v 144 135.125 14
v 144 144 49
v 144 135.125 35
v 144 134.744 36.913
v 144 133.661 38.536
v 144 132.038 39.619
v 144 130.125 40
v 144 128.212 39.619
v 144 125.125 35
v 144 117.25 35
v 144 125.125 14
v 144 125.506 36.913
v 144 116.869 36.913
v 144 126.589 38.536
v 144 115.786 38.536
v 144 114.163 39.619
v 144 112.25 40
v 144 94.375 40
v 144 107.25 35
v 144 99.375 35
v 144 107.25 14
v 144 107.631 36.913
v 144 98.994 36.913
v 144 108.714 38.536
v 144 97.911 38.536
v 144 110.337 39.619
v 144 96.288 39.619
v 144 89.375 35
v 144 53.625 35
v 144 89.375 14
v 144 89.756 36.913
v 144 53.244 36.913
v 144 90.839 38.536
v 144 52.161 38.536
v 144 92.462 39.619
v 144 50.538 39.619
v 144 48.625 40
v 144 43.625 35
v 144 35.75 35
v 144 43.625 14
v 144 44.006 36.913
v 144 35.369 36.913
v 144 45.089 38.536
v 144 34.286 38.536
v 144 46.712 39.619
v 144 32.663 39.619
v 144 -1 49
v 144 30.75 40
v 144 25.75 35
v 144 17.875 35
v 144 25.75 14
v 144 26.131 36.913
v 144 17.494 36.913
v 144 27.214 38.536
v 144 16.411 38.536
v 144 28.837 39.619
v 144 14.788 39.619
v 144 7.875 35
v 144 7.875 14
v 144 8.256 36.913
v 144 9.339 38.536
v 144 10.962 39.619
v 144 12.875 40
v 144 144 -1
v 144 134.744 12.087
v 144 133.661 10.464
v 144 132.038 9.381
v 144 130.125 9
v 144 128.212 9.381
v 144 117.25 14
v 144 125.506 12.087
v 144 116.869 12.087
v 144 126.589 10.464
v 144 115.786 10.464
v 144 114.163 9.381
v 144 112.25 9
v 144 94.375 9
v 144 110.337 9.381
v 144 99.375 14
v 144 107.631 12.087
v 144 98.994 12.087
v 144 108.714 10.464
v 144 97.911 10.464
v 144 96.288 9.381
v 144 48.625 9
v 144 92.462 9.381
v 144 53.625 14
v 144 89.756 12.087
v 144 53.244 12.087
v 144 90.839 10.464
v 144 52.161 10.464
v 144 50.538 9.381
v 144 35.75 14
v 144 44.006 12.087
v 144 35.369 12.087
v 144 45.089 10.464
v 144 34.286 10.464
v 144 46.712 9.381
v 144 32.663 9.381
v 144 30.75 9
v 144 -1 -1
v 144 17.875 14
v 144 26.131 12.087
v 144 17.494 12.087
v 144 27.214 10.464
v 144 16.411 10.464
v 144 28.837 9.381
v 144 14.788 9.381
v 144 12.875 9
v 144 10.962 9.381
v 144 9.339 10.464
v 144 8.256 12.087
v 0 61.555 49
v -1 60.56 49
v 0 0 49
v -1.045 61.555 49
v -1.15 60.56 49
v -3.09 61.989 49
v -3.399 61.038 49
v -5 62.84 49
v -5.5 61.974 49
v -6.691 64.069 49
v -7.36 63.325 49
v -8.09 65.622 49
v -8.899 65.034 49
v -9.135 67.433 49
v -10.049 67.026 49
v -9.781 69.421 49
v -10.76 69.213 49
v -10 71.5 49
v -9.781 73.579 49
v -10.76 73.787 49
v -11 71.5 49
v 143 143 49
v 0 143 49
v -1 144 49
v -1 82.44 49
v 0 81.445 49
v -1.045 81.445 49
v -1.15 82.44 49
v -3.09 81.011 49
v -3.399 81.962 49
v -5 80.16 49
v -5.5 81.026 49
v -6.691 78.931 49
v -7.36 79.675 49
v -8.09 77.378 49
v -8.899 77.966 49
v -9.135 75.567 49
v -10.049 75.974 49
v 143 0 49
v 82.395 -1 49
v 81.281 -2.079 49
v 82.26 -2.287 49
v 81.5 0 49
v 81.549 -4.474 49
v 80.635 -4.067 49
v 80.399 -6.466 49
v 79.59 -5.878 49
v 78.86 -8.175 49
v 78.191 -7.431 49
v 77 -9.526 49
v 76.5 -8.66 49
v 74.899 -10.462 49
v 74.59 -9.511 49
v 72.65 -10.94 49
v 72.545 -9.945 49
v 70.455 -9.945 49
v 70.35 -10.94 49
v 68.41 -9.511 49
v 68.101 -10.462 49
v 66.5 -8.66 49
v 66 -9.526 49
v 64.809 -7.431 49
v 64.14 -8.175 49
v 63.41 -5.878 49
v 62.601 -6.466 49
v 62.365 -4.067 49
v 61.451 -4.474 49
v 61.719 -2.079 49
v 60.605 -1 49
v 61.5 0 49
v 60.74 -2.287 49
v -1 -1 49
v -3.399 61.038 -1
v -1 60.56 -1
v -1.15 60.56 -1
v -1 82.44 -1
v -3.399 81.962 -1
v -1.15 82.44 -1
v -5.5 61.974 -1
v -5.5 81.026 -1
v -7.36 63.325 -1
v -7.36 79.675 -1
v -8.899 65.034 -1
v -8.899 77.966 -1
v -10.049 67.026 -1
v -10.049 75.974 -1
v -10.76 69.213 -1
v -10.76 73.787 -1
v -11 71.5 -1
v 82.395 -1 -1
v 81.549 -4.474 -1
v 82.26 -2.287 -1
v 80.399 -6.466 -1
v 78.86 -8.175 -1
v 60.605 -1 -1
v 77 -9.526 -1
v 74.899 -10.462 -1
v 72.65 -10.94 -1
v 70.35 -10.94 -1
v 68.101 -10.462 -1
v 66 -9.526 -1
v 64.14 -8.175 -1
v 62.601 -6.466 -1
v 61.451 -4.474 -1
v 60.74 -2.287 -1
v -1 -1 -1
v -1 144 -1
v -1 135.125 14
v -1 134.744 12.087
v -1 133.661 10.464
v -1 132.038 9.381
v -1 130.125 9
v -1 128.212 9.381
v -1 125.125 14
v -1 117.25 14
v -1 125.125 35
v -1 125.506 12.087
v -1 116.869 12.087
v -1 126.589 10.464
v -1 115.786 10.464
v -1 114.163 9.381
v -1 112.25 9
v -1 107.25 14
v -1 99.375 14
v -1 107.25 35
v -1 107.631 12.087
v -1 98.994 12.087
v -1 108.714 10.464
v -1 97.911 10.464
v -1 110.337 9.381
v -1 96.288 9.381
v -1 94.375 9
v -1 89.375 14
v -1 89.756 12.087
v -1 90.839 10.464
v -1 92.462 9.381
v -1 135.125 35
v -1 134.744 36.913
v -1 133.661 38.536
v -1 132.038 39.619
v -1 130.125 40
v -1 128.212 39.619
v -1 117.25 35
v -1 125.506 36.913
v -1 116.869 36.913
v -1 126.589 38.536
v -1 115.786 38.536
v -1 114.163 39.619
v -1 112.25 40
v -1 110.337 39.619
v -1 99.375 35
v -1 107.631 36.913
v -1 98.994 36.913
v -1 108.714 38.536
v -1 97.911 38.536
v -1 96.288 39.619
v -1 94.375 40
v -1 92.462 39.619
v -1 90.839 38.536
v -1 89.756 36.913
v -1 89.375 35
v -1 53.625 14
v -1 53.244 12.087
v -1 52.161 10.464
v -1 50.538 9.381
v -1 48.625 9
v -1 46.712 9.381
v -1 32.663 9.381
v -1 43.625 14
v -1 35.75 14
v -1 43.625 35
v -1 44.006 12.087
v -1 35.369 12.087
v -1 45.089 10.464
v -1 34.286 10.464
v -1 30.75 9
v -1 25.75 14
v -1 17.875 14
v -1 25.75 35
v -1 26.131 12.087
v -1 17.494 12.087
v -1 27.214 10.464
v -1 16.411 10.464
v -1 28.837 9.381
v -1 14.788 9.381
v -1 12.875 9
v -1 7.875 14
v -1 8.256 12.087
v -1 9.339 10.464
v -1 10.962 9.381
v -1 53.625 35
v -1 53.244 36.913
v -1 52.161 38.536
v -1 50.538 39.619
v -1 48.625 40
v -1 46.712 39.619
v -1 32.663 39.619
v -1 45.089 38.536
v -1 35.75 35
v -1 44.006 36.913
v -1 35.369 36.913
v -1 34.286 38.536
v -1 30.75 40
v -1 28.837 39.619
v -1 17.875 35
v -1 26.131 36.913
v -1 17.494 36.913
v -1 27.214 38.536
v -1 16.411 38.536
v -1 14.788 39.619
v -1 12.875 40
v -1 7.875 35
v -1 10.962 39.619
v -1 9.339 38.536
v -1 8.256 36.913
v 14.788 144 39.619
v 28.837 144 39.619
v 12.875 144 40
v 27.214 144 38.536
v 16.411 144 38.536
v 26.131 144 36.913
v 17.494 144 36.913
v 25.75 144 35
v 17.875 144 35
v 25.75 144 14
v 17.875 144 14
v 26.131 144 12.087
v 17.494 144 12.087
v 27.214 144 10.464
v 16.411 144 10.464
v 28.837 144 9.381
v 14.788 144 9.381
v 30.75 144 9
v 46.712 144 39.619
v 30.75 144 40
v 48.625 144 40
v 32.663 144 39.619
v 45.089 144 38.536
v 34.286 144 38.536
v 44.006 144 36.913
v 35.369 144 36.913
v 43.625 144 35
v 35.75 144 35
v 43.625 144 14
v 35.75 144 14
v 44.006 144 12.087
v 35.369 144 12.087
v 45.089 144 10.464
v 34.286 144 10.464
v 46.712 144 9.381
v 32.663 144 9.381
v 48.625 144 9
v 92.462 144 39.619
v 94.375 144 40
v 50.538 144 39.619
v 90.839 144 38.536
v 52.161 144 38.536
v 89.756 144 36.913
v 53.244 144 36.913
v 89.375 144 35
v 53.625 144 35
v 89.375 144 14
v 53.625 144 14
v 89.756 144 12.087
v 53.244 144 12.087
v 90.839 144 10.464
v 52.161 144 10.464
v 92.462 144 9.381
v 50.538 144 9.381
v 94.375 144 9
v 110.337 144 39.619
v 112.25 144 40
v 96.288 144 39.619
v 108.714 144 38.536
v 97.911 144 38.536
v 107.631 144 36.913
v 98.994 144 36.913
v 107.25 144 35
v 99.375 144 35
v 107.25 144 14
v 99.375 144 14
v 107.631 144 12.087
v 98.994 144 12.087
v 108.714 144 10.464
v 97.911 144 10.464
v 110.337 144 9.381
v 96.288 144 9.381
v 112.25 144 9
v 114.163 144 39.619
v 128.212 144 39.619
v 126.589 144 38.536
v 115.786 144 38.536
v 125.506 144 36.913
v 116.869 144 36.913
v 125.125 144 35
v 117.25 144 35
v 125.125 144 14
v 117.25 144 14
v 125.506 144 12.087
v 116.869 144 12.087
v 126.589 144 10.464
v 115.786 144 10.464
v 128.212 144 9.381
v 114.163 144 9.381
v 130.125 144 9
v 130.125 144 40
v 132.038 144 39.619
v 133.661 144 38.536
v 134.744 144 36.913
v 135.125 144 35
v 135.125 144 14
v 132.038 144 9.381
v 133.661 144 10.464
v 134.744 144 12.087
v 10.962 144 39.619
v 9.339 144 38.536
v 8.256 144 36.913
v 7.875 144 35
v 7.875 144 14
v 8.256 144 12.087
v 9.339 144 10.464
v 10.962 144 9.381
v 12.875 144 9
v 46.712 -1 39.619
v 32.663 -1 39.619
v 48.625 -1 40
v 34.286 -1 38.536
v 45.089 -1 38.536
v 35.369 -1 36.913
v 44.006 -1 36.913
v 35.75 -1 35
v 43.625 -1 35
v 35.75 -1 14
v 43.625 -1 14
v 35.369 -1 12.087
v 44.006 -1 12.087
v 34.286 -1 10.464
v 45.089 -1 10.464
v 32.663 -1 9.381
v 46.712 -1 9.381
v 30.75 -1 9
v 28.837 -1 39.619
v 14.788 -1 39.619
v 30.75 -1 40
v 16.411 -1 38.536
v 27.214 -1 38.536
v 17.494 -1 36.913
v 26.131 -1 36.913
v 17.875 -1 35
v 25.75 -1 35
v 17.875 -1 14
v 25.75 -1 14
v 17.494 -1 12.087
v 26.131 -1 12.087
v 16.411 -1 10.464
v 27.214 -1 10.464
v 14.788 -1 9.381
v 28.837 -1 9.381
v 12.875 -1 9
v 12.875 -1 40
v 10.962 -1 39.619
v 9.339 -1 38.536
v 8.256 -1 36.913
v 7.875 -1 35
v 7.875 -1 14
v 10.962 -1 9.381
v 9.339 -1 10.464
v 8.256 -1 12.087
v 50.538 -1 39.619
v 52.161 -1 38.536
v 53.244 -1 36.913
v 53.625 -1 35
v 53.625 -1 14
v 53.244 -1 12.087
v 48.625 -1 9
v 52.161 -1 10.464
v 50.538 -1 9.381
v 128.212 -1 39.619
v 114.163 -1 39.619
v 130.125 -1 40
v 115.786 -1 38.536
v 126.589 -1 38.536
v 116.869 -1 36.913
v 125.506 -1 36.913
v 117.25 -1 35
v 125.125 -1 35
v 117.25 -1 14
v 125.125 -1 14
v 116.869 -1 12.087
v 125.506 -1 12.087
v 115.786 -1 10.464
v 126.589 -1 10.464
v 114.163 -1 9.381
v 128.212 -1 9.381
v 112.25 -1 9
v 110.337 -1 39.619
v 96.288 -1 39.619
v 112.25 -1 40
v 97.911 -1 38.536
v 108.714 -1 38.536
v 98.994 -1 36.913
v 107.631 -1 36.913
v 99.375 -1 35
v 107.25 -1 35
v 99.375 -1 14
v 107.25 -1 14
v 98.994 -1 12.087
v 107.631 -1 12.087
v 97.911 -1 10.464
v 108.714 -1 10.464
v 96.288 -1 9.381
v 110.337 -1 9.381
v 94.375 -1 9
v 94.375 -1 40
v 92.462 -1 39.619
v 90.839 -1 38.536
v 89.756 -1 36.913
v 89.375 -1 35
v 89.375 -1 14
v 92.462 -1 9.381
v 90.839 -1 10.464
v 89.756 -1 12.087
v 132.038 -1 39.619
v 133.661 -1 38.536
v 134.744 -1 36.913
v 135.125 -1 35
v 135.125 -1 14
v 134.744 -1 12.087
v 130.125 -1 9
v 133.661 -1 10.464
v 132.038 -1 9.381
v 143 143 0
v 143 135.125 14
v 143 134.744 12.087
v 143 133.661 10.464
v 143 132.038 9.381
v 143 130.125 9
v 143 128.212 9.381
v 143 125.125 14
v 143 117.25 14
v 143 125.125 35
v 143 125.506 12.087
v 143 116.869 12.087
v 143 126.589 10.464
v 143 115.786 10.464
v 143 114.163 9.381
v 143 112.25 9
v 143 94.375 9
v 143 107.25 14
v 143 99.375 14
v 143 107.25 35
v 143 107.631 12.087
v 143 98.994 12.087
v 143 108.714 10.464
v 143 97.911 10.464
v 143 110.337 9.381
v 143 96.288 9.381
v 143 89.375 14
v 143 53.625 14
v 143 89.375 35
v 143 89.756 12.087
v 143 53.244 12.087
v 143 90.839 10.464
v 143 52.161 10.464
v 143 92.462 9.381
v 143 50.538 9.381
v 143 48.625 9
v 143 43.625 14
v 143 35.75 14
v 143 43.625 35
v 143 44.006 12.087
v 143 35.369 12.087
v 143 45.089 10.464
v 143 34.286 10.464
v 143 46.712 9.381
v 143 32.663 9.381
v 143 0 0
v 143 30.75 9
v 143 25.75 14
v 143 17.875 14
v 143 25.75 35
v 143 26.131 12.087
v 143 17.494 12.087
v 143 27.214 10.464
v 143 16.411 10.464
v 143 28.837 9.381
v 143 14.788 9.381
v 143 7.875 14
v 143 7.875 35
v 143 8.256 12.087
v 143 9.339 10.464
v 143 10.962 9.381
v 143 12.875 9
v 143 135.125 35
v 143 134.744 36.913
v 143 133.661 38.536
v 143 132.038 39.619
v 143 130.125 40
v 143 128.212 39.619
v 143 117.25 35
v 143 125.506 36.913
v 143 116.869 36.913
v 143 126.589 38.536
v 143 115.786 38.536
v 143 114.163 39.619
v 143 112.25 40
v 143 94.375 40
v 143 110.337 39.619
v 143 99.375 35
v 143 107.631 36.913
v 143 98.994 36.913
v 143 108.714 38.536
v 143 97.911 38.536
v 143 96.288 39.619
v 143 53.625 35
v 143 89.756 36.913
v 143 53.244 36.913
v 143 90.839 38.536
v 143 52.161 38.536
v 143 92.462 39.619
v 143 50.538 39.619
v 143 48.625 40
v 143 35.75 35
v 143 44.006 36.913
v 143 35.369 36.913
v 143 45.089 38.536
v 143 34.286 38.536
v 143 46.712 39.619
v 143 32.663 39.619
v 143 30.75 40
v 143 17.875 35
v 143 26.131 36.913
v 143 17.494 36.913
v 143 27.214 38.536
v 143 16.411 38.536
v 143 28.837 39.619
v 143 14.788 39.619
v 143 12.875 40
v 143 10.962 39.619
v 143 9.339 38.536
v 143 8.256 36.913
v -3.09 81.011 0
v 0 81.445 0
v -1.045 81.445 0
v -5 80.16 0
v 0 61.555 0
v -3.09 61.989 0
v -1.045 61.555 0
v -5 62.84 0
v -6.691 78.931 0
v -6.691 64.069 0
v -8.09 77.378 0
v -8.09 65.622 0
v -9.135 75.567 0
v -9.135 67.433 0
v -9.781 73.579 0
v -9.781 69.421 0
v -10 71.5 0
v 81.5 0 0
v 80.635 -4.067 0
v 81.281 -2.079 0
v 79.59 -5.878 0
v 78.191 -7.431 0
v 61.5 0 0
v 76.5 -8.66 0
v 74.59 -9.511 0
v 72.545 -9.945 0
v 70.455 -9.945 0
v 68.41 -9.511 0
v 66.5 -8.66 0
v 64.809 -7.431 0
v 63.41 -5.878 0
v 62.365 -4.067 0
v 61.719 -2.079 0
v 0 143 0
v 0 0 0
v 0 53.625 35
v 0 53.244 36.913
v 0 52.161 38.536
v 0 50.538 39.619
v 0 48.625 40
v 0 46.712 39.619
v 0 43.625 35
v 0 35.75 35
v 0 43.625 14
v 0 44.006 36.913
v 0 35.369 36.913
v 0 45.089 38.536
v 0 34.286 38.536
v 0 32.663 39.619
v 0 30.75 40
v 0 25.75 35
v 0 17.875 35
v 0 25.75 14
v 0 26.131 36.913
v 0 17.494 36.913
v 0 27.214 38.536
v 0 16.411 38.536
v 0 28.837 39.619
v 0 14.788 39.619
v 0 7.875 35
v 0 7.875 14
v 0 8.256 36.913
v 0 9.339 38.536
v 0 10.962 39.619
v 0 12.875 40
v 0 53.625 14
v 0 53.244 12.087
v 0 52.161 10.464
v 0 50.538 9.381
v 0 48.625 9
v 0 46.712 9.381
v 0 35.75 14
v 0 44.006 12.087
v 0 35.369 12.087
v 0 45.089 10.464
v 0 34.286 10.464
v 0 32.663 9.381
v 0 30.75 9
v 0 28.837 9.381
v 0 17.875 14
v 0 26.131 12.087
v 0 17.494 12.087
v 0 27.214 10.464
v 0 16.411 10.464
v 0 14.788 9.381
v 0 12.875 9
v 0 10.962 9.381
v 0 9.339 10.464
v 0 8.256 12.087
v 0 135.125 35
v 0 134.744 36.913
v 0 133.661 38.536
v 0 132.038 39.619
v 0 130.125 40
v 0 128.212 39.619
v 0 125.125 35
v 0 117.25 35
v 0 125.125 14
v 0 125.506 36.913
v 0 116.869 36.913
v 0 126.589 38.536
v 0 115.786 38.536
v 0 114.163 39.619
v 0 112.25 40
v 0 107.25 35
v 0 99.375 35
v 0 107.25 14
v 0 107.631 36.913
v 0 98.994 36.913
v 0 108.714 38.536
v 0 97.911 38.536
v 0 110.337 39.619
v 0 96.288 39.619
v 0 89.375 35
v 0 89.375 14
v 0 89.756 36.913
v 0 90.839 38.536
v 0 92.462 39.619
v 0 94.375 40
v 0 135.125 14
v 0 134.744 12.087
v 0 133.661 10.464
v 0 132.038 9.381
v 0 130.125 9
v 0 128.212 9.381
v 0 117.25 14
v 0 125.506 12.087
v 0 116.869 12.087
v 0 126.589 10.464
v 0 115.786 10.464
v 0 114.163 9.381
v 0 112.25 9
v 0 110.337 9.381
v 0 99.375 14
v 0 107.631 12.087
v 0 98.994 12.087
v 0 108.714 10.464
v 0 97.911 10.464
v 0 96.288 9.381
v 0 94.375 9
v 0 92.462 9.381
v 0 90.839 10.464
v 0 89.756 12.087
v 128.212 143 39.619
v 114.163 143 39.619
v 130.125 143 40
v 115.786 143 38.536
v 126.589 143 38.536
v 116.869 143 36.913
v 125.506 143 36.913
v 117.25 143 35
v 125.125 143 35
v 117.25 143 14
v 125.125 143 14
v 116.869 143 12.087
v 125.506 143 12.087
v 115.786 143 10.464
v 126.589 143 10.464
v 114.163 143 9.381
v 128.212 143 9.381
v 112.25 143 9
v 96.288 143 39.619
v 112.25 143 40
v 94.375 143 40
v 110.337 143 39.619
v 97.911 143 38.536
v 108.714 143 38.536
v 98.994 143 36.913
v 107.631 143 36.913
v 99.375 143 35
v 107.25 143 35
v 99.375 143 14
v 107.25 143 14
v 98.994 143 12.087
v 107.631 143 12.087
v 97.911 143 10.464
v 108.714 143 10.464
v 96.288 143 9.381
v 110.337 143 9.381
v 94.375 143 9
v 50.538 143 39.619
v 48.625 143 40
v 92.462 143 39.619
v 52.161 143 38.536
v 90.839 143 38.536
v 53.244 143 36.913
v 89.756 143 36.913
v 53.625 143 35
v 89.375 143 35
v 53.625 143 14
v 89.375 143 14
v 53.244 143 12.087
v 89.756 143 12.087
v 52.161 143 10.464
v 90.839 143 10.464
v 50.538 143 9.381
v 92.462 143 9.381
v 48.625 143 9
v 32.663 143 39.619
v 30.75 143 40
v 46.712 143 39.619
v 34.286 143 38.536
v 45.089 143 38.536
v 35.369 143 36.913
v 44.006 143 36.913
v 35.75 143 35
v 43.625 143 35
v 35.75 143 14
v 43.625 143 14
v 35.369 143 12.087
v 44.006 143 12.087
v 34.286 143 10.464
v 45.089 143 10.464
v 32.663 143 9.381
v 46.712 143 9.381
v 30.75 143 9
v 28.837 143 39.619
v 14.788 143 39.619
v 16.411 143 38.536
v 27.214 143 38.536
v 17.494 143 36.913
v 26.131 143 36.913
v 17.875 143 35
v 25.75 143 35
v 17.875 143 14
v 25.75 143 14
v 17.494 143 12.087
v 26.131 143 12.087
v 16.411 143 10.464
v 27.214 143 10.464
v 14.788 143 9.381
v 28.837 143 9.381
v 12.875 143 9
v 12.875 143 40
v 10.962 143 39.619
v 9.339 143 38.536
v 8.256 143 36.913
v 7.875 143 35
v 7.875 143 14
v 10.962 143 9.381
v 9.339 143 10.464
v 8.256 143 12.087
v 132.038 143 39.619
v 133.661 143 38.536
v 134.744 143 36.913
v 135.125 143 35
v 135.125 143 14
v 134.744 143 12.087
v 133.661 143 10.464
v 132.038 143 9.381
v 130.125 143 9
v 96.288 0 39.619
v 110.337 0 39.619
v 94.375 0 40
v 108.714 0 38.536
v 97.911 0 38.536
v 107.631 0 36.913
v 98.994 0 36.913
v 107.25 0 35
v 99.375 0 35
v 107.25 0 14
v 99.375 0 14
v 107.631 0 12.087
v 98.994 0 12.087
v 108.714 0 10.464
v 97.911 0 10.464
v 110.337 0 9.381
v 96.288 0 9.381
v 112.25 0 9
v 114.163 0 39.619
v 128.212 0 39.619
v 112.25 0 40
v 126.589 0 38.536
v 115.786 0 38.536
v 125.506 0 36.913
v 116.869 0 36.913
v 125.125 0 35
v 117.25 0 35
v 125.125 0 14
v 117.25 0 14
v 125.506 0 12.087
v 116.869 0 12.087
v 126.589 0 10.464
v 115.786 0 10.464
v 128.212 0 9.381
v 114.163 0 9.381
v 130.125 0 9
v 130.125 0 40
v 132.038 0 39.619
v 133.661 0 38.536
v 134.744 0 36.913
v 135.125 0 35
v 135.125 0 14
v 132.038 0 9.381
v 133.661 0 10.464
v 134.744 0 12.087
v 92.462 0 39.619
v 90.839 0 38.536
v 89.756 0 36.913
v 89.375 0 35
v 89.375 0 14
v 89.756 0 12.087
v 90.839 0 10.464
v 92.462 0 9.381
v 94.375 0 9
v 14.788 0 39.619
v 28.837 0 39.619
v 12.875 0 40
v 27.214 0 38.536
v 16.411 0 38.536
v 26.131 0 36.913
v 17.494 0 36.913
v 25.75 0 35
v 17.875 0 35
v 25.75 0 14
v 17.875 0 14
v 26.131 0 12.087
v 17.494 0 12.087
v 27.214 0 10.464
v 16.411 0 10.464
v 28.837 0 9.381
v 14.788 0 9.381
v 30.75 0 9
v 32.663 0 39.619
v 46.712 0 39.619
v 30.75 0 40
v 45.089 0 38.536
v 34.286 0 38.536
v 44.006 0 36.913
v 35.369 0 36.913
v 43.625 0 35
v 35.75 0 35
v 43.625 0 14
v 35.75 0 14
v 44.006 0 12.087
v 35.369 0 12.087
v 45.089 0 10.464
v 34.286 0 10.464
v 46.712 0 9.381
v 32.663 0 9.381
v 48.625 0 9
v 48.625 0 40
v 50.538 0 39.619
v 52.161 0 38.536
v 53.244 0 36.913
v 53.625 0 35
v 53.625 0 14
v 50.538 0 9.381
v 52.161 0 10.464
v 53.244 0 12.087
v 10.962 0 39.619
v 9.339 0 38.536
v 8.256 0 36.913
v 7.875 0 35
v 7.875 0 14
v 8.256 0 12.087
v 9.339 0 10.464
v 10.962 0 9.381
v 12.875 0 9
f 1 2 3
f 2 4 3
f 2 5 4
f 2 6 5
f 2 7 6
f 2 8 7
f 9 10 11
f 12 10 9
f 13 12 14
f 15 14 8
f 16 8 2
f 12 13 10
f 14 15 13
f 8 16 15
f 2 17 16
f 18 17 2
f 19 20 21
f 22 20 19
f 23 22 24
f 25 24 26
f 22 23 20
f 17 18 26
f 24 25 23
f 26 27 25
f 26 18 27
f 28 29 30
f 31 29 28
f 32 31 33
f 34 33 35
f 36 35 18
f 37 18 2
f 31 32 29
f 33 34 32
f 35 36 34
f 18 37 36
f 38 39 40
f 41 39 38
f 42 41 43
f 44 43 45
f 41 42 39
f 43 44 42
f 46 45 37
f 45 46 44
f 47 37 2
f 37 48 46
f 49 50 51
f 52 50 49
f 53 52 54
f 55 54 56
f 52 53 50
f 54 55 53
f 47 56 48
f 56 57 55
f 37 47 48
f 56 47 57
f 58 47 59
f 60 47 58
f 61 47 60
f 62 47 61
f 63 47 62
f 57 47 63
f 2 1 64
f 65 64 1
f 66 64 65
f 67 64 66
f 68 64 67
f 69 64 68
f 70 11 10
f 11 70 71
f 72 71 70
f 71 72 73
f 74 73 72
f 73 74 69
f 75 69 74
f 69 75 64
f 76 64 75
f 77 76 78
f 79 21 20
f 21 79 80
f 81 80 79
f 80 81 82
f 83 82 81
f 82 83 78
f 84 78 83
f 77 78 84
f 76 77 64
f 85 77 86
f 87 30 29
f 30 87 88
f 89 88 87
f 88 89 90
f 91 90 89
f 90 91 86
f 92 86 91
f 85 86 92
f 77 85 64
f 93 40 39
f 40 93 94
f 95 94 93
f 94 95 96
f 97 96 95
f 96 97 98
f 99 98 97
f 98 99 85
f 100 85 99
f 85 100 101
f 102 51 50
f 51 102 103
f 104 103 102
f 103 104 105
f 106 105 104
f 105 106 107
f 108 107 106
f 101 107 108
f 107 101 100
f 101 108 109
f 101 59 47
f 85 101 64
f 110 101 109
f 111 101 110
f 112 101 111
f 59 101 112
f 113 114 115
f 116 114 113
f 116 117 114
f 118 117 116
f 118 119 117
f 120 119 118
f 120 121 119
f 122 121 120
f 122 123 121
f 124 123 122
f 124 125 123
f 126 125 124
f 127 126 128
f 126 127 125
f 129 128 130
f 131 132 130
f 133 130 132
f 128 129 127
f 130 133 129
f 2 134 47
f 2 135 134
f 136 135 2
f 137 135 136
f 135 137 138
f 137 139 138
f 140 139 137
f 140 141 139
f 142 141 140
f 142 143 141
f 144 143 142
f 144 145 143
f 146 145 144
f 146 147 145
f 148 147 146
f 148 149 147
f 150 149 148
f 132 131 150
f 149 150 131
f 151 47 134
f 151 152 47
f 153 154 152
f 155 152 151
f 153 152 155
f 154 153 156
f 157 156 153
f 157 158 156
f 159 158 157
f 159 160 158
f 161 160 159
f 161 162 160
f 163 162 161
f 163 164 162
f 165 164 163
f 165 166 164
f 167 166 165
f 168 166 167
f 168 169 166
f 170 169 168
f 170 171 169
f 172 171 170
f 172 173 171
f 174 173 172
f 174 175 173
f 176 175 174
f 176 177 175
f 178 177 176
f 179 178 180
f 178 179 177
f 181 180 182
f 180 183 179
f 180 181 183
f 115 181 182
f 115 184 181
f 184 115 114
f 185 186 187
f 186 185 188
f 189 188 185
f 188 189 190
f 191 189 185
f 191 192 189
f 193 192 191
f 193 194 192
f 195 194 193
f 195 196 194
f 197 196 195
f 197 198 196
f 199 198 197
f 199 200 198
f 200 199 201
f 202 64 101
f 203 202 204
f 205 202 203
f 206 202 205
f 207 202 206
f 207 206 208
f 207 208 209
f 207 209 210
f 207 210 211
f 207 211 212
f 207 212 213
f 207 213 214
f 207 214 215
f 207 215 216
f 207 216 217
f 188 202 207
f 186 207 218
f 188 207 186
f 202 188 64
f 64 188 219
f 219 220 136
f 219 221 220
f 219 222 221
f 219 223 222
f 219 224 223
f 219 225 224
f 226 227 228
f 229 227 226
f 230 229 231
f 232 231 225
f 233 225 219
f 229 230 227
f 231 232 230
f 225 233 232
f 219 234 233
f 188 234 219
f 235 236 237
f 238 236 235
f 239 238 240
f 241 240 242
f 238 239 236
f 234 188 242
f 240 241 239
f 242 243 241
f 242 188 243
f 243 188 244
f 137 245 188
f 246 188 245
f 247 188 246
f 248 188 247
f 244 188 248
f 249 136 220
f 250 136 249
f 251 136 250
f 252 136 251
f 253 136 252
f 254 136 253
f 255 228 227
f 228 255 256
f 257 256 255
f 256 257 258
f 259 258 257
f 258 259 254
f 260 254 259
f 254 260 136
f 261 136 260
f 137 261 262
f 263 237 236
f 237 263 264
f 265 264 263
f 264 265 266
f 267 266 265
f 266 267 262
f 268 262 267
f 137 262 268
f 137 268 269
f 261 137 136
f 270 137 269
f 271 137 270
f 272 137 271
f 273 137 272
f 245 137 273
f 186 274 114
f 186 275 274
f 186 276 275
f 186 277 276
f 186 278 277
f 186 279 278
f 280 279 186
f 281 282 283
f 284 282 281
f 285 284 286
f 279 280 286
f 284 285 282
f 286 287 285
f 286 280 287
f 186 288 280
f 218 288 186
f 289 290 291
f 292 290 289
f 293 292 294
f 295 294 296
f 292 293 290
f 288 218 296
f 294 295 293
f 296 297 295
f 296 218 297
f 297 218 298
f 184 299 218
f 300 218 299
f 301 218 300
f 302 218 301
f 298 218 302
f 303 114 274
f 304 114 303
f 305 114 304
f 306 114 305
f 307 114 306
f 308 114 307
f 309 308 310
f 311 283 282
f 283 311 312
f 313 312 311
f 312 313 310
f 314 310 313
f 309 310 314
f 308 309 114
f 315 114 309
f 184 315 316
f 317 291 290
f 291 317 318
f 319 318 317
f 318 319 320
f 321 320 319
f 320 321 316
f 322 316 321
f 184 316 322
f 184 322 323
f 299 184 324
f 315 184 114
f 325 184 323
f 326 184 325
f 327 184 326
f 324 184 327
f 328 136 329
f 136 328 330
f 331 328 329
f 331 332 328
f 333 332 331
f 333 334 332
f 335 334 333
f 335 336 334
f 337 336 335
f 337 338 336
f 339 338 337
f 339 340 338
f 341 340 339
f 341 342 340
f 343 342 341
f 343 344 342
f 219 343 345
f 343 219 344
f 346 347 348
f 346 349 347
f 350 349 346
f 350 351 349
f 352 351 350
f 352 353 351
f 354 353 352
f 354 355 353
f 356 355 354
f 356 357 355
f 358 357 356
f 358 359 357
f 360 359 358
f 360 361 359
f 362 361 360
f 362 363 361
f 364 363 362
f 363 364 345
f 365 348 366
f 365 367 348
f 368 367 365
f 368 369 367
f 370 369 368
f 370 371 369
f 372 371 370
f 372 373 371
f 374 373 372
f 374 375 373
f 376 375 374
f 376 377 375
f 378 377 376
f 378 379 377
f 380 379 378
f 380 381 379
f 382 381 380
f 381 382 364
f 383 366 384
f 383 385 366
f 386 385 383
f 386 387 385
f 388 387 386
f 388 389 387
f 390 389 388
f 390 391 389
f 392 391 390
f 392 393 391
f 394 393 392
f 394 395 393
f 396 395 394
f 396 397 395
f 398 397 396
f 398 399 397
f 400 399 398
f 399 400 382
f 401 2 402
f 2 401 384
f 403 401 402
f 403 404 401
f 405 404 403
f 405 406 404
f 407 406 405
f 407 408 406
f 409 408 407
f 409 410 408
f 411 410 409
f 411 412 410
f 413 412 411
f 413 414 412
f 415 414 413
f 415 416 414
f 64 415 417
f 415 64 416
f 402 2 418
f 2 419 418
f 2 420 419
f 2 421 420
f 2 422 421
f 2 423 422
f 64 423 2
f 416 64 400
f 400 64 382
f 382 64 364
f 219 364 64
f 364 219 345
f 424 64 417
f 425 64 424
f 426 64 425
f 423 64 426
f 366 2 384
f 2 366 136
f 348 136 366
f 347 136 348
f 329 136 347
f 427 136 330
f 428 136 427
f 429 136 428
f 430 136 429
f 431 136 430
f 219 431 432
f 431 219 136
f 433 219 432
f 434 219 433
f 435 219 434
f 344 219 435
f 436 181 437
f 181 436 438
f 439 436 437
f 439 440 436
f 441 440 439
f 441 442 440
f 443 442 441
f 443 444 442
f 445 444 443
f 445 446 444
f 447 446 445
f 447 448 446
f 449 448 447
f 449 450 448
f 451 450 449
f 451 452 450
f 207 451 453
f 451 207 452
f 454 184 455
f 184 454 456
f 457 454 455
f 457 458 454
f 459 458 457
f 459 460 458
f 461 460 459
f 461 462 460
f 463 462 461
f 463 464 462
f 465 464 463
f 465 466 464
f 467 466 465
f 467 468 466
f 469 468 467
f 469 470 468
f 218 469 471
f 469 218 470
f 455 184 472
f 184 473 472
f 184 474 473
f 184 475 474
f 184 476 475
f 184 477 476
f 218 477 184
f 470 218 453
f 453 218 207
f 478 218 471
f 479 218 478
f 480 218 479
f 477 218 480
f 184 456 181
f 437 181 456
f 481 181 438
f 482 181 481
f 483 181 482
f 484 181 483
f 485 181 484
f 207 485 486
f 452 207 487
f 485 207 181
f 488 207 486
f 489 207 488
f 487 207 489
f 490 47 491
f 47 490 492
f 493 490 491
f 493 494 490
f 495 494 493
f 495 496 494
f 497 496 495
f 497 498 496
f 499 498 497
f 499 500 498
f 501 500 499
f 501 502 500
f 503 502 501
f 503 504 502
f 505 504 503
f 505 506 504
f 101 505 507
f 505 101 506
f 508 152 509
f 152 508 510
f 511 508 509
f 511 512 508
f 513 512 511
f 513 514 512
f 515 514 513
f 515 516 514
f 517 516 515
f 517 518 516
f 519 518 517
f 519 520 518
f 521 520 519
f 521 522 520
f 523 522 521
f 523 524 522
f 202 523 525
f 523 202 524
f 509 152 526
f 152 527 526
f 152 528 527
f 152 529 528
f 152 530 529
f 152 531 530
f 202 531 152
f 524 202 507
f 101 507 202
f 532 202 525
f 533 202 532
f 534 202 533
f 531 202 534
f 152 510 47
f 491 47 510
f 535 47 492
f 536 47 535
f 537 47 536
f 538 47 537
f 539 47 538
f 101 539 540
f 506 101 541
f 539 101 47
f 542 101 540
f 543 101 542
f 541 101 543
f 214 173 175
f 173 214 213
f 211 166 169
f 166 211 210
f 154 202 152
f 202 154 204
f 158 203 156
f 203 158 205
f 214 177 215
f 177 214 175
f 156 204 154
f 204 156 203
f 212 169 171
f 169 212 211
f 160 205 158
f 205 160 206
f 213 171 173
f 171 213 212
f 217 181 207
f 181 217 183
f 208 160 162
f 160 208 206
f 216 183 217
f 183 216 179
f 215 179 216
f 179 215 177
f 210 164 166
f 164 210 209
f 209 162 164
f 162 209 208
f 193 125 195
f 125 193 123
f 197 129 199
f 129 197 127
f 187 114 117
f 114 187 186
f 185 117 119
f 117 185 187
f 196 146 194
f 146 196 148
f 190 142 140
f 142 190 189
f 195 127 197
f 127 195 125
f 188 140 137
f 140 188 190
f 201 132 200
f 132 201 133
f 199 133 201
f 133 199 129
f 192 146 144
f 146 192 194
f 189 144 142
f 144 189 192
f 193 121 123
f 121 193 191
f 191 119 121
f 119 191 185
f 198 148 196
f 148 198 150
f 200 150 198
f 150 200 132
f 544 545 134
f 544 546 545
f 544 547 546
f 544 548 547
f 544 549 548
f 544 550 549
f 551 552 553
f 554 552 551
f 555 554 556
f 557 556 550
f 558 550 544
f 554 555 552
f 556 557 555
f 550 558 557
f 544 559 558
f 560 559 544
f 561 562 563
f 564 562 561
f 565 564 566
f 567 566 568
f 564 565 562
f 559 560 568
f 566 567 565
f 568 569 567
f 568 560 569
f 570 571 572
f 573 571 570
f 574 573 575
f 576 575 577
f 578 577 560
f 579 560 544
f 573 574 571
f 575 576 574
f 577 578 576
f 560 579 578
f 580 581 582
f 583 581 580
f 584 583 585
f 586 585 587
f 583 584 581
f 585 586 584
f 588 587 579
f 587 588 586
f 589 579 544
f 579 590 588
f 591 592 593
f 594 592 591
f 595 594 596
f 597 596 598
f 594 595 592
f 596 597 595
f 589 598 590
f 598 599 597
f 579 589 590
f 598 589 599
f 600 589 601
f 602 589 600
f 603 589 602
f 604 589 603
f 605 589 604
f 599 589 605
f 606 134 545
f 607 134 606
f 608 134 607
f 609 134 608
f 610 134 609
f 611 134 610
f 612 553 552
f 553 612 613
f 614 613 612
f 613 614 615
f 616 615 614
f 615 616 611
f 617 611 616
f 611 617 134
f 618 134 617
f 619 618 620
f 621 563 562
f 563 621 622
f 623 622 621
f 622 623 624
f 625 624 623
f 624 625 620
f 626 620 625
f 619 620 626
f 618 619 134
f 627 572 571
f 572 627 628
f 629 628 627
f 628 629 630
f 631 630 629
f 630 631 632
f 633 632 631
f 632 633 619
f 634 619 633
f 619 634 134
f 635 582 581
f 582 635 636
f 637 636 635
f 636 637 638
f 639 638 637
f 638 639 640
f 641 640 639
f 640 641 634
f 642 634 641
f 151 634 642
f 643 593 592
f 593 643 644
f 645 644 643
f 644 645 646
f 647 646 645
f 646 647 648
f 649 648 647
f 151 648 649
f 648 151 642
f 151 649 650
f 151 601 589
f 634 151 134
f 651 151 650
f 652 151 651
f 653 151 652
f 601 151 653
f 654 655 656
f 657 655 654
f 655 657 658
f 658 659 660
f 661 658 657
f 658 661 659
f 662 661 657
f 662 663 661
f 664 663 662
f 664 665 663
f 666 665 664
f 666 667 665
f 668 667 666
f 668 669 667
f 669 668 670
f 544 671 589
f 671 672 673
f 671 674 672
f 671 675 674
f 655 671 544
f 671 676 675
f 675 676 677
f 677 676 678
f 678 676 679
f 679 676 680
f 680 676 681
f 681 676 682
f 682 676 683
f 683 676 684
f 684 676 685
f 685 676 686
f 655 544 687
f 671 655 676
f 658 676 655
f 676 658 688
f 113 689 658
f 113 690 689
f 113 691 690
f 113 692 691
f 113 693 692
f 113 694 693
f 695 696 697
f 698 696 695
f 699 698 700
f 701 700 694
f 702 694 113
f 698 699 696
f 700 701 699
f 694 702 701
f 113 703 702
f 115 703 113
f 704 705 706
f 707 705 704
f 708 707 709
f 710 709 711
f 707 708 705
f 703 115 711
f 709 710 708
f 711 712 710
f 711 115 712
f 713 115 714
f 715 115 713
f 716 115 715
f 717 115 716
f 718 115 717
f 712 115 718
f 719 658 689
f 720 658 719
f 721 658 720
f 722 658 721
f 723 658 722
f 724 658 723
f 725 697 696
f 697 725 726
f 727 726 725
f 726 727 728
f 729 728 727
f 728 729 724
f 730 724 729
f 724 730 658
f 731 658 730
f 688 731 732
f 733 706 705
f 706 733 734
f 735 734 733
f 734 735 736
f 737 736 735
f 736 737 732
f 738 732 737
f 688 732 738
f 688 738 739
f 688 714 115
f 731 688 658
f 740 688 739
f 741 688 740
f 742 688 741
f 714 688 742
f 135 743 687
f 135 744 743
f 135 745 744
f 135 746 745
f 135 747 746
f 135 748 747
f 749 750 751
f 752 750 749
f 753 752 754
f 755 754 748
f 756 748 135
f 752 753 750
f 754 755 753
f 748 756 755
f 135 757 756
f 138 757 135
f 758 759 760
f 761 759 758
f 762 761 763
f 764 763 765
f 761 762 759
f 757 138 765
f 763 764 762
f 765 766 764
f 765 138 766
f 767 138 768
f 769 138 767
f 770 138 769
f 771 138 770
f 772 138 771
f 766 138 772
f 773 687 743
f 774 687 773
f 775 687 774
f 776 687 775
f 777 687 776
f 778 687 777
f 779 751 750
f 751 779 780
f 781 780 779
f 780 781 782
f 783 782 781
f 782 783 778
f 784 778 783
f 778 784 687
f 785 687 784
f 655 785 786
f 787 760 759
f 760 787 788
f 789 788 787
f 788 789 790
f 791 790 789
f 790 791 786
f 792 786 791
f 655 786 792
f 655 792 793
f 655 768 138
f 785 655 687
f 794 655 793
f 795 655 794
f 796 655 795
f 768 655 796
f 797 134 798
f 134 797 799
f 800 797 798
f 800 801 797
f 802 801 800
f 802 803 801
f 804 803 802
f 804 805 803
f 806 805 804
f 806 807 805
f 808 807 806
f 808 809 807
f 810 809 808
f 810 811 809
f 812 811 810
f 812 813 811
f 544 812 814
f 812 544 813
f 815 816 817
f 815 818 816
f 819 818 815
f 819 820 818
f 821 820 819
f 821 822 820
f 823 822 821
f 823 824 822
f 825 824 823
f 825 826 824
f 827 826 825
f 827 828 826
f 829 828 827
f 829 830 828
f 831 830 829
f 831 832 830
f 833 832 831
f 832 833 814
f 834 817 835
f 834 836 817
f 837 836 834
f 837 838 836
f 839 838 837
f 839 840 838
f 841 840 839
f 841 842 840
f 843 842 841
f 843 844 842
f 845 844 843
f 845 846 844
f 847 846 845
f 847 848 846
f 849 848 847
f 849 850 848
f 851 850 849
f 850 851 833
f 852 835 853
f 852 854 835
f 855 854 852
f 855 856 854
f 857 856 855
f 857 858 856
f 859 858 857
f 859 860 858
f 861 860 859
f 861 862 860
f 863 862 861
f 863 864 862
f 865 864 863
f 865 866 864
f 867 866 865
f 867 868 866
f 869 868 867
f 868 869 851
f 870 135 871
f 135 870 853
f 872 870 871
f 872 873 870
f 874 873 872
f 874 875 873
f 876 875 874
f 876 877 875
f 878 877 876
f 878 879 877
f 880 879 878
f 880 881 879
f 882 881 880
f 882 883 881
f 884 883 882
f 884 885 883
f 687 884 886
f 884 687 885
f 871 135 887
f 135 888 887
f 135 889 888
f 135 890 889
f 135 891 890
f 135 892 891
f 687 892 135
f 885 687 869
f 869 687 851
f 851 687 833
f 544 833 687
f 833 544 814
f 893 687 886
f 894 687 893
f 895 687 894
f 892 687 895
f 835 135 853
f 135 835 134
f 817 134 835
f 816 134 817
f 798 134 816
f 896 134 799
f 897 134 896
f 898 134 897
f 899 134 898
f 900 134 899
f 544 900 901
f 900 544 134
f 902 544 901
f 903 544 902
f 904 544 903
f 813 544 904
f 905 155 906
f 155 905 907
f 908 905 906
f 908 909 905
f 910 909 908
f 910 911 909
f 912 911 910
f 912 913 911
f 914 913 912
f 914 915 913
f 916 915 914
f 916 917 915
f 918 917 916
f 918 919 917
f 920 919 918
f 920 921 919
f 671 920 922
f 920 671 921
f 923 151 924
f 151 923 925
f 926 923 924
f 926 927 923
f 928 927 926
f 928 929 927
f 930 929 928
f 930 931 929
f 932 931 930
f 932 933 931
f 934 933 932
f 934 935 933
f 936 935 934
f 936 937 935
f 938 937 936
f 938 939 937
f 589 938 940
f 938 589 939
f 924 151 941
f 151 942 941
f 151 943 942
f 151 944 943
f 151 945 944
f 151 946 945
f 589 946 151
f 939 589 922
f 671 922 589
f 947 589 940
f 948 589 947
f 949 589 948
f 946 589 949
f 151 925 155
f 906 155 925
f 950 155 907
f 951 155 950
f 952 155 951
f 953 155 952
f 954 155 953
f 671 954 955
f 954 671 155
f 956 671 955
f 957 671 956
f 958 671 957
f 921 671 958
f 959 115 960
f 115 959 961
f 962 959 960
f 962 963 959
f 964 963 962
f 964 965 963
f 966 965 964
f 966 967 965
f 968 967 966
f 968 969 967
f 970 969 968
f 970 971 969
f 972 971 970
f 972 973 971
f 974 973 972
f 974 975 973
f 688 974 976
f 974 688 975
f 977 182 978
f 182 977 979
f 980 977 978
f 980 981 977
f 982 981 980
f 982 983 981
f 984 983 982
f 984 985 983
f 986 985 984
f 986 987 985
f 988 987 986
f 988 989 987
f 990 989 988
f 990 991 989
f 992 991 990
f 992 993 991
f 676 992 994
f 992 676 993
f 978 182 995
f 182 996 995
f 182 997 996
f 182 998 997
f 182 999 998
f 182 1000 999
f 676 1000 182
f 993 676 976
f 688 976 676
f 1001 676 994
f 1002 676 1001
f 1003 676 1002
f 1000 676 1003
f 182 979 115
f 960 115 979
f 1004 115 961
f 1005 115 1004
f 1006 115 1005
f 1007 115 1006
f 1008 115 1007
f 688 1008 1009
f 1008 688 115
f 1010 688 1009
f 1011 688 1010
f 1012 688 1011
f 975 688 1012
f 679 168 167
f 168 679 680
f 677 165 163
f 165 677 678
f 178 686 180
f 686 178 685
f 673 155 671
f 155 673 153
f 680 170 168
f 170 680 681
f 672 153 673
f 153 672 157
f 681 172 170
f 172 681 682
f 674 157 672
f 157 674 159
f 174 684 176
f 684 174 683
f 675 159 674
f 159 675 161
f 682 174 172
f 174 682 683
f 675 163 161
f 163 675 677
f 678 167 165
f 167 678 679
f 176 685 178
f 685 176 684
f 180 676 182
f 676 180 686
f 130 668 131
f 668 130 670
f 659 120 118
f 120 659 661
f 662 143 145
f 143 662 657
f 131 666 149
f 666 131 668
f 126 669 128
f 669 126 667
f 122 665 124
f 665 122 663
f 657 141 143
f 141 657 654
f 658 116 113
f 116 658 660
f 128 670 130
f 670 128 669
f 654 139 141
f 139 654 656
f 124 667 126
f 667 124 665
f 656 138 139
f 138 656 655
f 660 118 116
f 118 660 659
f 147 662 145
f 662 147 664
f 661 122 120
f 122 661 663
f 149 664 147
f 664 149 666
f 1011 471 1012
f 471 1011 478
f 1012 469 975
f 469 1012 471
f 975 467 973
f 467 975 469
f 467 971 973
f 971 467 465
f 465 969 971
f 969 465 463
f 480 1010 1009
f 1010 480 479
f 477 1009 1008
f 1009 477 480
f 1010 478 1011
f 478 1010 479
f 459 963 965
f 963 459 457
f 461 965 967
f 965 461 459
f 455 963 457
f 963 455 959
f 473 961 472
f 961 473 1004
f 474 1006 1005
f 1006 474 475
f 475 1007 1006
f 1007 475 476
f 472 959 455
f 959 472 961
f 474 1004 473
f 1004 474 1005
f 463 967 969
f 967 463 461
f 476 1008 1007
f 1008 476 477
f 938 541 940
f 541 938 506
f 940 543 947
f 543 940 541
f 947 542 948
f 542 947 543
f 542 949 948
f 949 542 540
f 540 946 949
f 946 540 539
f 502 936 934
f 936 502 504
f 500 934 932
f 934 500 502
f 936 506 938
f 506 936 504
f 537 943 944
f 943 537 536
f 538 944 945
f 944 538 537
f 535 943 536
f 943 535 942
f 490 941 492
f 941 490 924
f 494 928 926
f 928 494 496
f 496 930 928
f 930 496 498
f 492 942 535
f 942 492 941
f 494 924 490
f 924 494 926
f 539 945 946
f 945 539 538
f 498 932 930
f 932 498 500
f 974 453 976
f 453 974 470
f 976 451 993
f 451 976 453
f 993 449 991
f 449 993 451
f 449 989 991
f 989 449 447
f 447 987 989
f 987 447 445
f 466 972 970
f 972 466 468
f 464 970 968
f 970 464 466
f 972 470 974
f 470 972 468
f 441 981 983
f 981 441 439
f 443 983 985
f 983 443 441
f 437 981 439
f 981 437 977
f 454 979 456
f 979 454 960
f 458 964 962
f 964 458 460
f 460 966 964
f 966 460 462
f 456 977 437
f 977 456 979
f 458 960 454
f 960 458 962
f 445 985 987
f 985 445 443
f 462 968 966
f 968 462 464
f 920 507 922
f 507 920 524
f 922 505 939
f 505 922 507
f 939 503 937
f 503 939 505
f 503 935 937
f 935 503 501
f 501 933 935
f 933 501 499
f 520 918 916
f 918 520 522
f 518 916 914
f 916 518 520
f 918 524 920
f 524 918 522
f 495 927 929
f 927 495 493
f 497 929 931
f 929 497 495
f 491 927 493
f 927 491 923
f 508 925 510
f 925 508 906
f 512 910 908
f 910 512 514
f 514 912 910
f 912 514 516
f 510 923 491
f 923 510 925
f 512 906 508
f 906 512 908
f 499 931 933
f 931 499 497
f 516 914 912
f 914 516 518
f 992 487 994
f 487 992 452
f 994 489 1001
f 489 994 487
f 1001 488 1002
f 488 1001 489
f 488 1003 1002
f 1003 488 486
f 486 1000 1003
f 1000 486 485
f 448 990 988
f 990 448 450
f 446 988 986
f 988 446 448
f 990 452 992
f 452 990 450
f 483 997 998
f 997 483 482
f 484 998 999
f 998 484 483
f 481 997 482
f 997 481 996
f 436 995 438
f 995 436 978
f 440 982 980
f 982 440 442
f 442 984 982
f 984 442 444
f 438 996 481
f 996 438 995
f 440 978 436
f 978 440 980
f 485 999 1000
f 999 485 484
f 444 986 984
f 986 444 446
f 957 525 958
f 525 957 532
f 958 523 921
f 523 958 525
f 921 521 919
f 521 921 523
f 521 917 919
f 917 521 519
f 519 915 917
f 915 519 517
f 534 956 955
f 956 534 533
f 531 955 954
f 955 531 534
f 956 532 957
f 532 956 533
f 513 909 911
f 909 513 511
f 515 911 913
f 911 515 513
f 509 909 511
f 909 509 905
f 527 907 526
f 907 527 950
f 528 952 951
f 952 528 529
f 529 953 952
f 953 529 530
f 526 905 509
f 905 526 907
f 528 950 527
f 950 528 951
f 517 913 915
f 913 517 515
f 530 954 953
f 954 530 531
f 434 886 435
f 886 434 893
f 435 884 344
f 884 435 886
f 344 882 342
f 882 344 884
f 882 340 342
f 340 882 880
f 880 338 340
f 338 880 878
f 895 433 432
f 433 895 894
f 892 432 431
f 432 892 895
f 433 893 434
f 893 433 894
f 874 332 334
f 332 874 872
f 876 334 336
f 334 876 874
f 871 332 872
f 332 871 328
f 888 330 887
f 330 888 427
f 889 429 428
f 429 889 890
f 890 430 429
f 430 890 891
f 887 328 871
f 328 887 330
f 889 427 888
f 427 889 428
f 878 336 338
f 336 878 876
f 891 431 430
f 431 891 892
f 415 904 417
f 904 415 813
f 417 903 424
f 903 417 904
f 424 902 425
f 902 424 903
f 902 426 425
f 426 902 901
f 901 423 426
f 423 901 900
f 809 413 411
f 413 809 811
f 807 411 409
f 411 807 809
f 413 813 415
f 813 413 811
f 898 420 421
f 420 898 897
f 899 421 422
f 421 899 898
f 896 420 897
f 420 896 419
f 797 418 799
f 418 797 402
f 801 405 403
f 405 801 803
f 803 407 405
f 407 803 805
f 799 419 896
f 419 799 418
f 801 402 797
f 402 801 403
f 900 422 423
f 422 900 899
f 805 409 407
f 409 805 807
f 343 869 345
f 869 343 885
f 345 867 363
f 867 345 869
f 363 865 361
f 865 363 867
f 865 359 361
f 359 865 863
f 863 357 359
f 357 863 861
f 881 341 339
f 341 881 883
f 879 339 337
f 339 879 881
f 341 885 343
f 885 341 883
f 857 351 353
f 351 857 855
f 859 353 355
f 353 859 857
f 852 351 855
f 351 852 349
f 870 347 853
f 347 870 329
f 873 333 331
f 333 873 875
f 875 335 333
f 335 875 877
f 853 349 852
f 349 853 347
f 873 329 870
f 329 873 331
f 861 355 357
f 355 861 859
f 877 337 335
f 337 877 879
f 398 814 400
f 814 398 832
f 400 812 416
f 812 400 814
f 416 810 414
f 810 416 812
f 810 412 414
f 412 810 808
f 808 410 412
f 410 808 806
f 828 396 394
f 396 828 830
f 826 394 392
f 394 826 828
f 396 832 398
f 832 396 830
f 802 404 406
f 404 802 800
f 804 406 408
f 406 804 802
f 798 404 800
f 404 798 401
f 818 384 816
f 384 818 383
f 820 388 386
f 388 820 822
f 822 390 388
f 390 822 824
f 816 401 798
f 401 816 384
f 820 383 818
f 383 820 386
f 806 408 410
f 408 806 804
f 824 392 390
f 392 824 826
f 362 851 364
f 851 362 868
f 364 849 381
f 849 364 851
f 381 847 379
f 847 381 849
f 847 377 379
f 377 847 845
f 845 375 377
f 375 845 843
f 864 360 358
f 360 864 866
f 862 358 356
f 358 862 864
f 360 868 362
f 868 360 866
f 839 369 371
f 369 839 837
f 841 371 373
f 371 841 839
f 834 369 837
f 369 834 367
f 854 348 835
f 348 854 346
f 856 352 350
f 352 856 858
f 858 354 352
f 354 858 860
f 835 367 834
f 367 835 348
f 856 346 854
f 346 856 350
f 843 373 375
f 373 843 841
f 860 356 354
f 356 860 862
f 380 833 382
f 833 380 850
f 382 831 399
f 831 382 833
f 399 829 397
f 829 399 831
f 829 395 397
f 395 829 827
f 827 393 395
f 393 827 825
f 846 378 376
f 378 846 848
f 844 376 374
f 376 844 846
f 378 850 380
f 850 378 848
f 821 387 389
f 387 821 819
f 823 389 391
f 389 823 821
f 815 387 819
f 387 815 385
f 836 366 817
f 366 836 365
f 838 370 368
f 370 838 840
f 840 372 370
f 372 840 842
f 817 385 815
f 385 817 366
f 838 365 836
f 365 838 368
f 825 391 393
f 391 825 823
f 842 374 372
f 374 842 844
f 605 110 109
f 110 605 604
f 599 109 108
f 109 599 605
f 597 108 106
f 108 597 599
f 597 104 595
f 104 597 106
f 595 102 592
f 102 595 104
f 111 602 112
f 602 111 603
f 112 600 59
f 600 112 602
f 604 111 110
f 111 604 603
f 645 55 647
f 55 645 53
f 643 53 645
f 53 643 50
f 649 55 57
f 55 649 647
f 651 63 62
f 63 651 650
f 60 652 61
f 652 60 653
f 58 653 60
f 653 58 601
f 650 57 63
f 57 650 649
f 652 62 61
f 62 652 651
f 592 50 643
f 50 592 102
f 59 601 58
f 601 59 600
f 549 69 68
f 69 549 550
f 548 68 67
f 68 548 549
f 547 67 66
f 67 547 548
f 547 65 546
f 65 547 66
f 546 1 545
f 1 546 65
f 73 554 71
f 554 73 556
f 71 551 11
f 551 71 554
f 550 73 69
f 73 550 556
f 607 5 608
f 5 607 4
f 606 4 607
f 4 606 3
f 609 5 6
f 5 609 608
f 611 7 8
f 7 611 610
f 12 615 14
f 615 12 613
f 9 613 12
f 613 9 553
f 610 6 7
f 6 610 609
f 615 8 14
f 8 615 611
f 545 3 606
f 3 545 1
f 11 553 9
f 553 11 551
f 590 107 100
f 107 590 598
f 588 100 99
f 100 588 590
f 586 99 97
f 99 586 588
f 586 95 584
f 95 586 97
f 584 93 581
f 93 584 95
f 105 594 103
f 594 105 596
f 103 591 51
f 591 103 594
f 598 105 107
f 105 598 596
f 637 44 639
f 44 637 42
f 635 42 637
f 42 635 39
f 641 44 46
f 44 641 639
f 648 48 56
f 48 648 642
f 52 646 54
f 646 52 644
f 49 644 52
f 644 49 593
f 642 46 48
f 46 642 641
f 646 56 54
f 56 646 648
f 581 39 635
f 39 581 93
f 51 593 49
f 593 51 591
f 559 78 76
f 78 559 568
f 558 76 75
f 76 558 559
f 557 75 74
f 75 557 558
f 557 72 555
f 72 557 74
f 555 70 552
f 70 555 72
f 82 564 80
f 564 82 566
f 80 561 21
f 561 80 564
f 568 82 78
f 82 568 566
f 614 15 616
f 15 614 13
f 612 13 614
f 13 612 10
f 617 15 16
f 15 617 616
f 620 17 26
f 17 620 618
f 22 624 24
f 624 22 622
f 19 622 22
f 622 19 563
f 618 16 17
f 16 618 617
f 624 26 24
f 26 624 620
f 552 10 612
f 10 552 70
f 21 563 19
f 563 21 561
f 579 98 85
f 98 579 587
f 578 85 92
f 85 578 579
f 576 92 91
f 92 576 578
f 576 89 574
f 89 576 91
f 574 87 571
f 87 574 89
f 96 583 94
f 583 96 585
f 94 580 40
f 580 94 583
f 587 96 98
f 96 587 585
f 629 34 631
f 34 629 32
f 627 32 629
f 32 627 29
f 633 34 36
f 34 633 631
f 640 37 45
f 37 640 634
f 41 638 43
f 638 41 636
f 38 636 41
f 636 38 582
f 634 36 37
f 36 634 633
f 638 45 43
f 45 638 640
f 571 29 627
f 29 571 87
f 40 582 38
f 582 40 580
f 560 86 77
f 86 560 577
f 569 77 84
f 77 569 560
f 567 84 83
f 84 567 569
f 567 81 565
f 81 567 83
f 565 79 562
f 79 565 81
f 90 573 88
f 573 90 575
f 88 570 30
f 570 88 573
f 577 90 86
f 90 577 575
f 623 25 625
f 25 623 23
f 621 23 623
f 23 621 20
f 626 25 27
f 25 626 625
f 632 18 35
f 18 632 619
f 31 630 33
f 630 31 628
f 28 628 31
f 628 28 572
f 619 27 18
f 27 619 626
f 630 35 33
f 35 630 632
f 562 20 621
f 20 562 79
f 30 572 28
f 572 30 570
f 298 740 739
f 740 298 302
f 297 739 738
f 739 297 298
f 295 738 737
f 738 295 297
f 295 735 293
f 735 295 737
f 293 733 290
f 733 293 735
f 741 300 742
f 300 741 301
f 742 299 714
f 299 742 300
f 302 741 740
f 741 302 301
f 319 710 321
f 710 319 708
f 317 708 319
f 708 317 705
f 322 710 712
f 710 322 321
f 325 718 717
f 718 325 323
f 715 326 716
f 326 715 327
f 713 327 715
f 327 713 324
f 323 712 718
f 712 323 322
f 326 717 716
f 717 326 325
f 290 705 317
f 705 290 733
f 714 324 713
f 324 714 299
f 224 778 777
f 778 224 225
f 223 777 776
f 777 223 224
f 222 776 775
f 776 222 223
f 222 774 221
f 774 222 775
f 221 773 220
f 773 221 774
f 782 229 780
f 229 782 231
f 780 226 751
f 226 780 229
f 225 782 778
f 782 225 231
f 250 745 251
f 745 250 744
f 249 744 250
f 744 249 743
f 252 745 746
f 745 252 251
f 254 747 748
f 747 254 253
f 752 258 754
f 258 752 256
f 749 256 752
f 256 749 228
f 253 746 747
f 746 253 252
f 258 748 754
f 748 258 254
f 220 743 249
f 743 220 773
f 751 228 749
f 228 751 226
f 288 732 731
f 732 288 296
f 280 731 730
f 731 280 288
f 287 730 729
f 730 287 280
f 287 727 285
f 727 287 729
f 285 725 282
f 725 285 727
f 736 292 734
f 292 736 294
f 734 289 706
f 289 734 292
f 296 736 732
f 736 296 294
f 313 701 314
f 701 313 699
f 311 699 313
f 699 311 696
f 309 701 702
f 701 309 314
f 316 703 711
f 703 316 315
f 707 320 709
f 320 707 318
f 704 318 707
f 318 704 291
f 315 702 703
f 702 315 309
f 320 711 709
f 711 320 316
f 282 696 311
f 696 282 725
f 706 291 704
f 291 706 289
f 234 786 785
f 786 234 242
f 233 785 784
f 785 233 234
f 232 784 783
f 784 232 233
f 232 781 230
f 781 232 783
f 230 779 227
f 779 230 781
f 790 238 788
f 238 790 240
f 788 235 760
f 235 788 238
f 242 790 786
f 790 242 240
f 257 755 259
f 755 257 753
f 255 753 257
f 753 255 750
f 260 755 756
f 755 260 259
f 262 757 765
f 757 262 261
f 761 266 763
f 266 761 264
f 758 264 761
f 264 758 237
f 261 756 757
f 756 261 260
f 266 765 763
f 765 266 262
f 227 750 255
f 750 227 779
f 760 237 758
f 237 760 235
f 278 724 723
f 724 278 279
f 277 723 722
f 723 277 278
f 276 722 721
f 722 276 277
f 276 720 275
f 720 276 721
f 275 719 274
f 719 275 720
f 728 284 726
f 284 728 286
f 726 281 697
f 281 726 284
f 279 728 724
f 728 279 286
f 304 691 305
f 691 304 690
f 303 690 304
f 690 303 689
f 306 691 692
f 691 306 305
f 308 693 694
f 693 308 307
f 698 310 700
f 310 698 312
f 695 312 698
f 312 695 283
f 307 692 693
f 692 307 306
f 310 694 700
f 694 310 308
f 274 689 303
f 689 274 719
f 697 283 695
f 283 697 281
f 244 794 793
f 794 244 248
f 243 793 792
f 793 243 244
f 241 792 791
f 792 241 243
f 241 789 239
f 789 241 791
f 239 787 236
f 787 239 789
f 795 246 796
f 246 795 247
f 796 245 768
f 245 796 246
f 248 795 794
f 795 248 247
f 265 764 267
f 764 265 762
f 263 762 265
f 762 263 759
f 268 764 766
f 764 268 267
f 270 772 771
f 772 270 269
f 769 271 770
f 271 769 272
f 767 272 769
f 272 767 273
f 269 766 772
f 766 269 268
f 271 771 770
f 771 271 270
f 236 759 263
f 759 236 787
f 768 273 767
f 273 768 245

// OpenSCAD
/*
 * Simple box for the Karak/Caracassonne tiles grid.
 *
 * Author: Vojtech Horky
 * License: CC BY-SA 4.0
 *
 * The actual tiles grid was created by user timqui and is available at:
 * https://www.printables.com/model/74459-carcassonne-karak-isle-of-skye-tiles-grid/
 *
 */


size = 143;
lock_size = 20;
height = 50;
wall_width = 1;

hole_width = 10;
hole_top_margin = 10;
hole_bottom_margin = 9;
hole_half_count = 3;

space_for_holes = (size - lock_size) / 2;
space_between_holes = 
    (space_for_holes - hole_half_count * hole_width) / (hole_half_count + 1 );
hole_height = height - hole_top_margin - hole_bottom_margin;

module the_box(size, height, lock_size, lock_offset=0) {
    cube([size, size, height]);
    translate([size / 2, lock_offset, 0]) {
        cylinder(h=height, d=lock_size);
    }
    translate([lock_offset, size / 2, 0]) {
        cylinder(h=height, d=lock_size);
    }
}

module the_hole(width, height, thickness) {
    rotate([90, 0, 0]) {
        translate([0, width/2, -thickness/2]) {
            union() {
                cylinder(h=thickness, d=width);
                translate([0, height - width, 0]) cylinder(h=thickness, d=width);
                translate([-width/2, 0, 0]) cube([width, height - width, thickness]);
            }
        }
    }
}

difference() {
    translate([-wall_width, -wall_width, -wall_width]) {
        the_box(size + 2*wall_width, height, lock_size + 2*wall_width, wall_width);
    }
    union() {
        the_box(size, height, lock_size);
        for (pair=[[0, 0], [0, size], [90, -size], [90, 0]]) {
            angle = pair[0];
            y_shift= pair[1];
            if (hole_half_count > 0) {
                for (i=[0:(hole_half_count-1)]) {
                    shift_x = hole_width/2
                        + space_between_holes
                        + (space_between_holes + hole_width) * i;
                    rotate([0, 0, angle]) {
                        translate([shift_x, y_shift, hole_bottom_margin]) {
                            the_hole(hole_width, hole_height, wall_width * 4);
                        }
                    }
                    rotate([0, 0, angle]) {
                        translate([size - shift_x, y_shift, hole_bottom_margin]) {
                            the_hole(hole_width, hole_height, wall_width * 4);
                        }
                    }
                }
           }
        }
    }
}
